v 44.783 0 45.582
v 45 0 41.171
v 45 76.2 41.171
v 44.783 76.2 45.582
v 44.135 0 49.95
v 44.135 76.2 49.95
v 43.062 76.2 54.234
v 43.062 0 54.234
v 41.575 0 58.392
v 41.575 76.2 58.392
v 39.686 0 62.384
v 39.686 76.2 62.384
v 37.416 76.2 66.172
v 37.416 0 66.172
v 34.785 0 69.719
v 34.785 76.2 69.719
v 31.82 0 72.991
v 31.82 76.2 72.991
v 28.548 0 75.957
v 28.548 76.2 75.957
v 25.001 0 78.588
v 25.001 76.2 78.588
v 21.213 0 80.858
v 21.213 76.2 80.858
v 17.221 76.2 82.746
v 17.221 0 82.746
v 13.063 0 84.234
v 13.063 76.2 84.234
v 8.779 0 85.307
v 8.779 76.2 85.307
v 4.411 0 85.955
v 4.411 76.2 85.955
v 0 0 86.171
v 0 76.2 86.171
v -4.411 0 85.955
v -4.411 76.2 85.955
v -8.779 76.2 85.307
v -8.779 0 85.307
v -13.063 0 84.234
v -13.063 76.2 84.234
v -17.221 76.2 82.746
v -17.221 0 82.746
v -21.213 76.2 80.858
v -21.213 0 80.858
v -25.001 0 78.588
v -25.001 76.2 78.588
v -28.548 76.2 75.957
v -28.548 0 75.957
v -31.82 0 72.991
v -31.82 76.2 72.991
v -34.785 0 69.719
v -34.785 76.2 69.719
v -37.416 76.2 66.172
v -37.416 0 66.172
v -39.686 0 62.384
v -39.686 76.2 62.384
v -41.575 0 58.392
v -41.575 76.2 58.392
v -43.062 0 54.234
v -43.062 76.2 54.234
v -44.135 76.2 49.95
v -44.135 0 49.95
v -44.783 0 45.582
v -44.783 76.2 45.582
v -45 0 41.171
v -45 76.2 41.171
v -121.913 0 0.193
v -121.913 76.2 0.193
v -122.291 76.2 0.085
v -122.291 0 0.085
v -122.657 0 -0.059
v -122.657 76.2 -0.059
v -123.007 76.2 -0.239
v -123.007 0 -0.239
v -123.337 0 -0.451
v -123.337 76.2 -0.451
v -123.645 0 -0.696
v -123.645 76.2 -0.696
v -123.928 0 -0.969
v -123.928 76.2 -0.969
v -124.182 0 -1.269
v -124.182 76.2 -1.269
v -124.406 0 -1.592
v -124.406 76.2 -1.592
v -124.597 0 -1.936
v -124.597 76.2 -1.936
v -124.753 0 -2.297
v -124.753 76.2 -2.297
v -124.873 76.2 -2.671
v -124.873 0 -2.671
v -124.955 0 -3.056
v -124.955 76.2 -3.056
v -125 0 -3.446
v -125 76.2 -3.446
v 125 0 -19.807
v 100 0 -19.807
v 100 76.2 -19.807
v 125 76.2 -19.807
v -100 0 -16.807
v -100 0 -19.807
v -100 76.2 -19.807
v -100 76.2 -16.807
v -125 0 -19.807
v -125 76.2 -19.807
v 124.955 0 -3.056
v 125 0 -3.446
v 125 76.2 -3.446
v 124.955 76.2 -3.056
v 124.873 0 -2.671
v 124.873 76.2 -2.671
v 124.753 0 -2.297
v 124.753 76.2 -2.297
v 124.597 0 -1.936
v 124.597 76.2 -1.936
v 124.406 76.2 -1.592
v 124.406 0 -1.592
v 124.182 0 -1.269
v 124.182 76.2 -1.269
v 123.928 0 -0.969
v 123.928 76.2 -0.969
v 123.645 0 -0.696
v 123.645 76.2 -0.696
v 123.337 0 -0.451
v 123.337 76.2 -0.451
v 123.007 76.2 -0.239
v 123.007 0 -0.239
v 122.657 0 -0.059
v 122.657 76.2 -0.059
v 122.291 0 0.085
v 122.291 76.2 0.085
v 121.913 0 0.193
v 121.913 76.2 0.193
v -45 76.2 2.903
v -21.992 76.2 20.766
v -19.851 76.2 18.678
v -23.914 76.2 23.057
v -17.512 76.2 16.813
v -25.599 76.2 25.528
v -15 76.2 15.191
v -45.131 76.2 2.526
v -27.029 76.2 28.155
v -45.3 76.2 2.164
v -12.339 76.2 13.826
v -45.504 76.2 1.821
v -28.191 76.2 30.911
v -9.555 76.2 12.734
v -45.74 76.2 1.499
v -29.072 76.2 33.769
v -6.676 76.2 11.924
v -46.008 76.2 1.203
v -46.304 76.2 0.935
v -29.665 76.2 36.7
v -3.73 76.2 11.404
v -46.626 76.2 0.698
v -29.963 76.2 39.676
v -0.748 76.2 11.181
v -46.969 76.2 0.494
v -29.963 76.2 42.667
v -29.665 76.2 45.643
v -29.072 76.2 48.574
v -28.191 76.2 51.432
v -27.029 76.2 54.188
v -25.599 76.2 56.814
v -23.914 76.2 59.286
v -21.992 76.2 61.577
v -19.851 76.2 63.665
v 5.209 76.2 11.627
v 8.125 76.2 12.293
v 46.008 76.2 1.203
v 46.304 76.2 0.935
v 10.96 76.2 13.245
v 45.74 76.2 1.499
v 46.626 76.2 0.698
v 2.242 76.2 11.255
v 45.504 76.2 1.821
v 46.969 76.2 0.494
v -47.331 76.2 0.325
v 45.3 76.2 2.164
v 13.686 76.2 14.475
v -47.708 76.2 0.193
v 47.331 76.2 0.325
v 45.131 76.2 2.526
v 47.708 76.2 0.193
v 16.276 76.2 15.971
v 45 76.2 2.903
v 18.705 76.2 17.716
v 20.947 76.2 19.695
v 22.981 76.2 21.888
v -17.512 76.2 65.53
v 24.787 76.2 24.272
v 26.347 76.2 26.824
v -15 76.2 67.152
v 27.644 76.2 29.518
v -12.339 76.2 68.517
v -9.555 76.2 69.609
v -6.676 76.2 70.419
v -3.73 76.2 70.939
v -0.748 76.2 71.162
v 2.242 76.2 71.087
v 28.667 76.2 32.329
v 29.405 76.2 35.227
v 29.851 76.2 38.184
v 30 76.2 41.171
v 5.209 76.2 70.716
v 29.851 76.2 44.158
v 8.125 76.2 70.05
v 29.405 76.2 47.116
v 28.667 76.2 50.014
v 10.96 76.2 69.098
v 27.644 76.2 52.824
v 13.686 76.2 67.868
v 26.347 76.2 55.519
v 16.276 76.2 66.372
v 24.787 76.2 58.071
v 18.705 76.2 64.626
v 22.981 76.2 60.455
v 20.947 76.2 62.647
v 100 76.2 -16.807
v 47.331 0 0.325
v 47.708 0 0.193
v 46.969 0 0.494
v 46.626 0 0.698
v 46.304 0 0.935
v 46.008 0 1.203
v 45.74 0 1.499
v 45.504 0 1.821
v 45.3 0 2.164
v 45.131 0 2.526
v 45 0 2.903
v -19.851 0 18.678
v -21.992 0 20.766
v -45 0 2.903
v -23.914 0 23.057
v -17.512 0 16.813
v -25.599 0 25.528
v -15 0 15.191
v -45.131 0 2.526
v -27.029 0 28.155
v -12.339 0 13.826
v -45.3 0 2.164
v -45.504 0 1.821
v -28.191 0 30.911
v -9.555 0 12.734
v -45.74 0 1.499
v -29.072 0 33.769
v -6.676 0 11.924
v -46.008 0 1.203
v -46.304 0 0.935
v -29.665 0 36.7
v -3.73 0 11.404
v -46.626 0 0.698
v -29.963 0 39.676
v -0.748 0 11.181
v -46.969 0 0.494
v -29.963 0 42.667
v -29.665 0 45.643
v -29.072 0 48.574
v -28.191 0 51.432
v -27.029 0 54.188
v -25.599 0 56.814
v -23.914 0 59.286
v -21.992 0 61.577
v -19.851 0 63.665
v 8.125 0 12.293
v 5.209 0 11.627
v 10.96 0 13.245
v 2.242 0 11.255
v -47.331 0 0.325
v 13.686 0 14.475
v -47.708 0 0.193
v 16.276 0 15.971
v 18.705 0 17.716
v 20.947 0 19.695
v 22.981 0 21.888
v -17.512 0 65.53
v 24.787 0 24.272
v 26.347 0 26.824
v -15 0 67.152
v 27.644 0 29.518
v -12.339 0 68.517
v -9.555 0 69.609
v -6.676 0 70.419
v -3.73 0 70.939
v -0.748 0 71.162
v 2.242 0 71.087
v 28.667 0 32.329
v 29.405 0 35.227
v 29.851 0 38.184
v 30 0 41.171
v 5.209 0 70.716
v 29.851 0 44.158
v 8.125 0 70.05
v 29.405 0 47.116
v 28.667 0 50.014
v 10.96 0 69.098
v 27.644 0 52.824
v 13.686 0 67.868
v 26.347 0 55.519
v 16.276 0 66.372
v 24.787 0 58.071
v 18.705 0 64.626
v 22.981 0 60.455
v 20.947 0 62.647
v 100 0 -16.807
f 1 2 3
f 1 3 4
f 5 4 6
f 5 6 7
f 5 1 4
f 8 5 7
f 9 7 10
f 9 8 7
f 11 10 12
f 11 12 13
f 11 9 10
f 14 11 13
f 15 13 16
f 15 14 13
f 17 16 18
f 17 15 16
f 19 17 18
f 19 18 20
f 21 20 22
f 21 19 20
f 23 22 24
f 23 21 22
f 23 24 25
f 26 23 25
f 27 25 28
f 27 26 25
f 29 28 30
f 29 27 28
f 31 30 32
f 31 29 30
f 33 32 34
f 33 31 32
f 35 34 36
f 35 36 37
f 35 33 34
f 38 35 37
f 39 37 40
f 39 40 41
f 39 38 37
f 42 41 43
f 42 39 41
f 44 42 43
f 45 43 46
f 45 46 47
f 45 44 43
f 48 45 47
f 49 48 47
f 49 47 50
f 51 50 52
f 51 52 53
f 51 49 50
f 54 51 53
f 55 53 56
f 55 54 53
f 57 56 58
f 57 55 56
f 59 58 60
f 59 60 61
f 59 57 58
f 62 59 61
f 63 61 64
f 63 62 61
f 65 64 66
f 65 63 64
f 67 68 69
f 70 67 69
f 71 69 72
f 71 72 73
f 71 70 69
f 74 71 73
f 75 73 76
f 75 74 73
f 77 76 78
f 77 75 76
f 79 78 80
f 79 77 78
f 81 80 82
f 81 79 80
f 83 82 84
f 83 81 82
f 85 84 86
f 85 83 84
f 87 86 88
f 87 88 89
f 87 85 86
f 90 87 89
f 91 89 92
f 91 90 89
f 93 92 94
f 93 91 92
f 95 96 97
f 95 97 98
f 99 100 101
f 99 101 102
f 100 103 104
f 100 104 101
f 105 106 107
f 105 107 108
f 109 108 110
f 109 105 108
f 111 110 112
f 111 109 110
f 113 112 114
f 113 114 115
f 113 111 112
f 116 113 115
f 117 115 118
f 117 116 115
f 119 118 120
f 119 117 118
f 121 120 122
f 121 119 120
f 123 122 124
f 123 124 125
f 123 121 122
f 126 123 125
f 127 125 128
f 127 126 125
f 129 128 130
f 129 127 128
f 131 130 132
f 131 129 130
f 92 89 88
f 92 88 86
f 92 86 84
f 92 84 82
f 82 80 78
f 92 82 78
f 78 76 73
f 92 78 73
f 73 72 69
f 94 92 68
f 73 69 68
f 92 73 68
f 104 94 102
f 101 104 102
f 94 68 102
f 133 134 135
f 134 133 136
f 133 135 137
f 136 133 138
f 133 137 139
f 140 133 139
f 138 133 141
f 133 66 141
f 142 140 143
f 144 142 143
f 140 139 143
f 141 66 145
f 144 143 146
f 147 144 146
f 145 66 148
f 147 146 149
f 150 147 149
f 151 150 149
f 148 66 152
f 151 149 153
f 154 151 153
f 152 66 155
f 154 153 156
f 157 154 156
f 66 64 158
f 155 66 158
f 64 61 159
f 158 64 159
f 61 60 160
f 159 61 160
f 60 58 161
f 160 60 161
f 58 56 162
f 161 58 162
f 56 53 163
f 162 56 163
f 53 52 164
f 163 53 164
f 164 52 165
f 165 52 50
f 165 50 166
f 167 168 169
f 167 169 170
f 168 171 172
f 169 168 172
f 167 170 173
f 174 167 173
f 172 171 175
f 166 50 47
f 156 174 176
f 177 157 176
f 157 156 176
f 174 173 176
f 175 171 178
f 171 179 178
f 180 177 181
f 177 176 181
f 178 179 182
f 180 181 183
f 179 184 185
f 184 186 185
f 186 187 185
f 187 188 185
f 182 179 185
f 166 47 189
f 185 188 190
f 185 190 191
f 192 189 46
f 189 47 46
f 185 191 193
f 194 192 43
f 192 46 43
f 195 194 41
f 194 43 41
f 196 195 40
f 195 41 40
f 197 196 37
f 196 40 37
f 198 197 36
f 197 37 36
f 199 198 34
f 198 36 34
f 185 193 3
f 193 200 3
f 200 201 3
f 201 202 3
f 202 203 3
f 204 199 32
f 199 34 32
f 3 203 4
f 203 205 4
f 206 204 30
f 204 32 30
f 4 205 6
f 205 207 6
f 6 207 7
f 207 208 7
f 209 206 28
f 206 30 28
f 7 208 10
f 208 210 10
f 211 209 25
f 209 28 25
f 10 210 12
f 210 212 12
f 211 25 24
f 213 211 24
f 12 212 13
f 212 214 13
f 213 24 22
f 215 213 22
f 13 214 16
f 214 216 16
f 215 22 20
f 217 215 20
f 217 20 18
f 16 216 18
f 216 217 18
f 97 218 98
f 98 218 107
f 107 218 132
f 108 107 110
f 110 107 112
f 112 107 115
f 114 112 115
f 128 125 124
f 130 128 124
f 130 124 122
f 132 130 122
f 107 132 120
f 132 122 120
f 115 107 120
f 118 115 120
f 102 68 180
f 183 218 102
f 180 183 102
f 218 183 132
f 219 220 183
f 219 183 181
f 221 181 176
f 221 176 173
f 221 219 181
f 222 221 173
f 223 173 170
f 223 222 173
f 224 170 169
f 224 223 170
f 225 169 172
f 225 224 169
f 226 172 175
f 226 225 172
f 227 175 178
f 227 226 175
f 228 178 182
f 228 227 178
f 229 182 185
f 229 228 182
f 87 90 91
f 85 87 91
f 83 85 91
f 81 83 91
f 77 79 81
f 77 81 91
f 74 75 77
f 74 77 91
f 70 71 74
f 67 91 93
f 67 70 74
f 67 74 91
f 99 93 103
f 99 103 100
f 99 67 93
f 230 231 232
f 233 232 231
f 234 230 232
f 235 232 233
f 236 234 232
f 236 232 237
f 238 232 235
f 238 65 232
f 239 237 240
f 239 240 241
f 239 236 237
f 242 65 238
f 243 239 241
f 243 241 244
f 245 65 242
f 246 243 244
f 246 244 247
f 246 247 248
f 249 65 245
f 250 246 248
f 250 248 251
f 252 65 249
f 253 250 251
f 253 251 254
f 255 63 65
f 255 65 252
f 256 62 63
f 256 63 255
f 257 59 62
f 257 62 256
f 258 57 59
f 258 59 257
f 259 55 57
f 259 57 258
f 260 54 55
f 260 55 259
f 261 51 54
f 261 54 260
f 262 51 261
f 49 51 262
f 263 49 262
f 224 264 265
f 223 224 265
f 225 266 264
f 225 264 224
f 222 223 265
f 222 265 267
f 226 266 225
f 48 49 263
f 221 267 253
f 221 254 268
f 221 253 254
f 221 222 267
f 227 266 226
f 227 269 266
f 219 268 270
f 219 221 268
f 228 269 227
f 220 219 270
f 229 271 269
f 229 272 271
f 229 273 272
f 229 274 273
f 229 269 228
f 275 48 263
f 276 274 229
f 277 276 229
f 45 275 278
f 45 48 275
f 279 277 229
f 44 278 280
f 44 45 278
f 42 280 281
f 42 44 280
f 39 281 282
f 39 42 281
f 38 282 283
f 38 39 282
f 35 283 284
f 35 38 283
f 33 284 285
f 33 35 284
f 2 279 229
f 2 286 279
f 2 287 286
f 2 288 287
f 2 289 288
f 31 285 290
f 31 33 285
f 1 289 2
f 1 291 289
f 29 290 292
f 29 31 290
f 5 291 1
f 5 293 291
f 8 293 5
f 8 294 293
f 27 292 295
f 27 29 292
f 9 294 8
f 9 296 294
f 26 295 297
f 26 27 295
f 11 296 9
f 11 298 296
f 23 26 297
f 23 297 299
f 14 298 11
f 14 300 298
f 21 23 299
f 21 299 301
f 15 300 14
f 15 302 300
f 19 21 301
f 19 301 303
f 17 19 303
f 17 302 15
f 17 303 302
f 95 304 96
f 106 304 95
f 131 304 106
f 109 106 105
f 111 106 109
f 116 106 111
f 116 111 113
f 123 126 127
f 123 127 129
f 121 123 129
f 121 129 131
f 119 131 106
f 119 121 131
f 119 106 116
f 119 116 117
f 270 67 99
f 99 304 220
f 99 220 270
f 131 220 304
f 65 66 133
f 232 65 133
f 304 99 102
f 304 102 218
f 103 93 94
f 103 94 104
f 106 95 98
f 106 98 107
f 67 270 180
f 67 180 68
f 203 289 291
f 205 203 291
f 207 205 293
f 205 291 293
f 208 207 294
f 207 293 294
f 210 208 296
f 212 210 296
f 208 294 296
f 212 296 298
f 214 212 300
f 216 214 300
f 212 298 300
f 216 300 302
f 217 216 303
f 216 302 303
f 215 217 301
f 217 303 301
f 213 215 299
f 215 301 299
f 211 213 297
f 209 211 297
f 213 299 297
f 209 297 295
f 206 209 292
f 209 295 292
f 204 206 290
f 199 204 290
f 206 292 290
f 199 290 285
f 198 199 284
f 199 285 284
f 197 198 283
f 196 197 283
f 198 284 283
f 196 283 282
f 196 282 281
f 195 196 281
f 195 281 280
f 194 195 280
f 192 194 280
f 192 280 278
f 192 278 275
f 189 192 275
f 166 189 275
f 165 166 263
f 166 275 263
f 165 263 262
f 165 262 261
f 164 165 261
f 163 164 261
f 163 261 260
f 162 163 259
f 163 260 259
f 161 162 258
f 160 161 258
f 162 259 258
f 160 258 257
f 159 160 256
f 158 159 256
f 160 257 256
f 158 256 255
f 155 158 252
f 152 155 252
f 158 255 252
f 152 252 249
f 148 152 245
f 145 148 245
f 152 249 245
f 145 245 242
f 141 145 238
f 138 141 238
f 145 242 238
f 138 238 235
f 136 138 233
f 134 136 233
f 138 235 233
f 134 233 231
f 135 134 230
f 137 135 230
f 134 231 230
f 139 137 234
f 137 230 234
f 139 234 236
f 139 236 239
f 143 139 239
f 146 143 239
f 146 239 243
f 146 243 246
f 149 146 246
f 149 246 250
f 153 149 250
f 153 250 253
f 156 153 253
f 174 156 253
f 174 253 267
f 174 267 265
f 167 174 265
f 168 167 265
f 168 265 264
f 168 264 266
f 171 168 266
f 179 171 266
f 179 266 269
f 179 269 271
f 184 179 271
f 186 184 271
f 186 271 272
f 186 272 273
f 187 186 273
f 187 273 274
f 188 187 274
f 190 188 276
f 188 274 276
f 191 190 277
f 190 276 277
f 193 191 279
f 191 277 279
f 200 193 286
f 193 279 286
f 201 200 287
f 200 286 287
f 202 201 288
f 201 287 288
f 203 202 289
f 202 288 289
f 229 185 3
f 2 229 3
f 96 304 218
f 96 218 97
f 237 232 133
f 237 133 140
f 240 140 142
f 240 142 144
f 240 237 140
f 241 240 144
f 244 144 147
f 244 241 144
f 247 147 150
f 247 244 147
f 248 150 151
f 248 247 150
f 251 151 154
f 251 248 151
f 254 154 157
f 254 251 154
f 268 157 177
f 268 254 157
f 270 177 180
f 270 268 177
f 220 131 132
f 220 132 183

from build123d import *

# Parameters (mm, degrees)
F0_R     = 30
F1_DEPTH = 76.2


with BuildPart() as f1:
    # F0 (on Front) → F1 (new body)
    with BuildSketch(Plane.XZ):
        with BuildLine():
            Line((45, 2.903346), (45, 41.171368))
            ThreePointArc((45, 41.171368), (0, 86.171368), (-45, 41.171368))
            Line((-45, 41.171368), (-45, 2.903346))
            ThreePointArc((-45, 2.903346), (-46.008278, 1.202846), (-47.707793, 0.192909))
            Line((-47.707793, 0.192909), (-121.913321, 0.192909))
            ThreePointArc((-121.913321, 0.192909), (-124.058806, -1.116044), (-125, -3.446413))
            Line((-125, -3.446413), (-125, -19.807091))
            Line((-125, -19.807091), (-100, -19.807091))
            Line((-100, -19.807091), (-100, -16.807091))
            Line((-100, -16.807091), (0, -16.807091))
            Line((0, -16.807091), (100, -16.807091))
            Line((100, -16.807091), (100, -19.807091))
            Line((100, -19.807091), (125, -19.807091))
            Line((125, -19.807091), (125, -3.446413))
            ThreePointArc((125, -3.446413), (124.058806, -1.116044), (121.913321, 0.192909))
            Line((121.913321, 0.192909), (47.707793, 0.192909))
            ThreePointArc((47.707793, 0.192909), (46.008278, 1.202846), (45, 2.903346))
        make_face()
        with Locations((0, 41.171368)):
            Circle(F0_R, mode=Mode.SUBTRACT)
    extrude(amount=-F1_DEPTH)


solid = f1.part
